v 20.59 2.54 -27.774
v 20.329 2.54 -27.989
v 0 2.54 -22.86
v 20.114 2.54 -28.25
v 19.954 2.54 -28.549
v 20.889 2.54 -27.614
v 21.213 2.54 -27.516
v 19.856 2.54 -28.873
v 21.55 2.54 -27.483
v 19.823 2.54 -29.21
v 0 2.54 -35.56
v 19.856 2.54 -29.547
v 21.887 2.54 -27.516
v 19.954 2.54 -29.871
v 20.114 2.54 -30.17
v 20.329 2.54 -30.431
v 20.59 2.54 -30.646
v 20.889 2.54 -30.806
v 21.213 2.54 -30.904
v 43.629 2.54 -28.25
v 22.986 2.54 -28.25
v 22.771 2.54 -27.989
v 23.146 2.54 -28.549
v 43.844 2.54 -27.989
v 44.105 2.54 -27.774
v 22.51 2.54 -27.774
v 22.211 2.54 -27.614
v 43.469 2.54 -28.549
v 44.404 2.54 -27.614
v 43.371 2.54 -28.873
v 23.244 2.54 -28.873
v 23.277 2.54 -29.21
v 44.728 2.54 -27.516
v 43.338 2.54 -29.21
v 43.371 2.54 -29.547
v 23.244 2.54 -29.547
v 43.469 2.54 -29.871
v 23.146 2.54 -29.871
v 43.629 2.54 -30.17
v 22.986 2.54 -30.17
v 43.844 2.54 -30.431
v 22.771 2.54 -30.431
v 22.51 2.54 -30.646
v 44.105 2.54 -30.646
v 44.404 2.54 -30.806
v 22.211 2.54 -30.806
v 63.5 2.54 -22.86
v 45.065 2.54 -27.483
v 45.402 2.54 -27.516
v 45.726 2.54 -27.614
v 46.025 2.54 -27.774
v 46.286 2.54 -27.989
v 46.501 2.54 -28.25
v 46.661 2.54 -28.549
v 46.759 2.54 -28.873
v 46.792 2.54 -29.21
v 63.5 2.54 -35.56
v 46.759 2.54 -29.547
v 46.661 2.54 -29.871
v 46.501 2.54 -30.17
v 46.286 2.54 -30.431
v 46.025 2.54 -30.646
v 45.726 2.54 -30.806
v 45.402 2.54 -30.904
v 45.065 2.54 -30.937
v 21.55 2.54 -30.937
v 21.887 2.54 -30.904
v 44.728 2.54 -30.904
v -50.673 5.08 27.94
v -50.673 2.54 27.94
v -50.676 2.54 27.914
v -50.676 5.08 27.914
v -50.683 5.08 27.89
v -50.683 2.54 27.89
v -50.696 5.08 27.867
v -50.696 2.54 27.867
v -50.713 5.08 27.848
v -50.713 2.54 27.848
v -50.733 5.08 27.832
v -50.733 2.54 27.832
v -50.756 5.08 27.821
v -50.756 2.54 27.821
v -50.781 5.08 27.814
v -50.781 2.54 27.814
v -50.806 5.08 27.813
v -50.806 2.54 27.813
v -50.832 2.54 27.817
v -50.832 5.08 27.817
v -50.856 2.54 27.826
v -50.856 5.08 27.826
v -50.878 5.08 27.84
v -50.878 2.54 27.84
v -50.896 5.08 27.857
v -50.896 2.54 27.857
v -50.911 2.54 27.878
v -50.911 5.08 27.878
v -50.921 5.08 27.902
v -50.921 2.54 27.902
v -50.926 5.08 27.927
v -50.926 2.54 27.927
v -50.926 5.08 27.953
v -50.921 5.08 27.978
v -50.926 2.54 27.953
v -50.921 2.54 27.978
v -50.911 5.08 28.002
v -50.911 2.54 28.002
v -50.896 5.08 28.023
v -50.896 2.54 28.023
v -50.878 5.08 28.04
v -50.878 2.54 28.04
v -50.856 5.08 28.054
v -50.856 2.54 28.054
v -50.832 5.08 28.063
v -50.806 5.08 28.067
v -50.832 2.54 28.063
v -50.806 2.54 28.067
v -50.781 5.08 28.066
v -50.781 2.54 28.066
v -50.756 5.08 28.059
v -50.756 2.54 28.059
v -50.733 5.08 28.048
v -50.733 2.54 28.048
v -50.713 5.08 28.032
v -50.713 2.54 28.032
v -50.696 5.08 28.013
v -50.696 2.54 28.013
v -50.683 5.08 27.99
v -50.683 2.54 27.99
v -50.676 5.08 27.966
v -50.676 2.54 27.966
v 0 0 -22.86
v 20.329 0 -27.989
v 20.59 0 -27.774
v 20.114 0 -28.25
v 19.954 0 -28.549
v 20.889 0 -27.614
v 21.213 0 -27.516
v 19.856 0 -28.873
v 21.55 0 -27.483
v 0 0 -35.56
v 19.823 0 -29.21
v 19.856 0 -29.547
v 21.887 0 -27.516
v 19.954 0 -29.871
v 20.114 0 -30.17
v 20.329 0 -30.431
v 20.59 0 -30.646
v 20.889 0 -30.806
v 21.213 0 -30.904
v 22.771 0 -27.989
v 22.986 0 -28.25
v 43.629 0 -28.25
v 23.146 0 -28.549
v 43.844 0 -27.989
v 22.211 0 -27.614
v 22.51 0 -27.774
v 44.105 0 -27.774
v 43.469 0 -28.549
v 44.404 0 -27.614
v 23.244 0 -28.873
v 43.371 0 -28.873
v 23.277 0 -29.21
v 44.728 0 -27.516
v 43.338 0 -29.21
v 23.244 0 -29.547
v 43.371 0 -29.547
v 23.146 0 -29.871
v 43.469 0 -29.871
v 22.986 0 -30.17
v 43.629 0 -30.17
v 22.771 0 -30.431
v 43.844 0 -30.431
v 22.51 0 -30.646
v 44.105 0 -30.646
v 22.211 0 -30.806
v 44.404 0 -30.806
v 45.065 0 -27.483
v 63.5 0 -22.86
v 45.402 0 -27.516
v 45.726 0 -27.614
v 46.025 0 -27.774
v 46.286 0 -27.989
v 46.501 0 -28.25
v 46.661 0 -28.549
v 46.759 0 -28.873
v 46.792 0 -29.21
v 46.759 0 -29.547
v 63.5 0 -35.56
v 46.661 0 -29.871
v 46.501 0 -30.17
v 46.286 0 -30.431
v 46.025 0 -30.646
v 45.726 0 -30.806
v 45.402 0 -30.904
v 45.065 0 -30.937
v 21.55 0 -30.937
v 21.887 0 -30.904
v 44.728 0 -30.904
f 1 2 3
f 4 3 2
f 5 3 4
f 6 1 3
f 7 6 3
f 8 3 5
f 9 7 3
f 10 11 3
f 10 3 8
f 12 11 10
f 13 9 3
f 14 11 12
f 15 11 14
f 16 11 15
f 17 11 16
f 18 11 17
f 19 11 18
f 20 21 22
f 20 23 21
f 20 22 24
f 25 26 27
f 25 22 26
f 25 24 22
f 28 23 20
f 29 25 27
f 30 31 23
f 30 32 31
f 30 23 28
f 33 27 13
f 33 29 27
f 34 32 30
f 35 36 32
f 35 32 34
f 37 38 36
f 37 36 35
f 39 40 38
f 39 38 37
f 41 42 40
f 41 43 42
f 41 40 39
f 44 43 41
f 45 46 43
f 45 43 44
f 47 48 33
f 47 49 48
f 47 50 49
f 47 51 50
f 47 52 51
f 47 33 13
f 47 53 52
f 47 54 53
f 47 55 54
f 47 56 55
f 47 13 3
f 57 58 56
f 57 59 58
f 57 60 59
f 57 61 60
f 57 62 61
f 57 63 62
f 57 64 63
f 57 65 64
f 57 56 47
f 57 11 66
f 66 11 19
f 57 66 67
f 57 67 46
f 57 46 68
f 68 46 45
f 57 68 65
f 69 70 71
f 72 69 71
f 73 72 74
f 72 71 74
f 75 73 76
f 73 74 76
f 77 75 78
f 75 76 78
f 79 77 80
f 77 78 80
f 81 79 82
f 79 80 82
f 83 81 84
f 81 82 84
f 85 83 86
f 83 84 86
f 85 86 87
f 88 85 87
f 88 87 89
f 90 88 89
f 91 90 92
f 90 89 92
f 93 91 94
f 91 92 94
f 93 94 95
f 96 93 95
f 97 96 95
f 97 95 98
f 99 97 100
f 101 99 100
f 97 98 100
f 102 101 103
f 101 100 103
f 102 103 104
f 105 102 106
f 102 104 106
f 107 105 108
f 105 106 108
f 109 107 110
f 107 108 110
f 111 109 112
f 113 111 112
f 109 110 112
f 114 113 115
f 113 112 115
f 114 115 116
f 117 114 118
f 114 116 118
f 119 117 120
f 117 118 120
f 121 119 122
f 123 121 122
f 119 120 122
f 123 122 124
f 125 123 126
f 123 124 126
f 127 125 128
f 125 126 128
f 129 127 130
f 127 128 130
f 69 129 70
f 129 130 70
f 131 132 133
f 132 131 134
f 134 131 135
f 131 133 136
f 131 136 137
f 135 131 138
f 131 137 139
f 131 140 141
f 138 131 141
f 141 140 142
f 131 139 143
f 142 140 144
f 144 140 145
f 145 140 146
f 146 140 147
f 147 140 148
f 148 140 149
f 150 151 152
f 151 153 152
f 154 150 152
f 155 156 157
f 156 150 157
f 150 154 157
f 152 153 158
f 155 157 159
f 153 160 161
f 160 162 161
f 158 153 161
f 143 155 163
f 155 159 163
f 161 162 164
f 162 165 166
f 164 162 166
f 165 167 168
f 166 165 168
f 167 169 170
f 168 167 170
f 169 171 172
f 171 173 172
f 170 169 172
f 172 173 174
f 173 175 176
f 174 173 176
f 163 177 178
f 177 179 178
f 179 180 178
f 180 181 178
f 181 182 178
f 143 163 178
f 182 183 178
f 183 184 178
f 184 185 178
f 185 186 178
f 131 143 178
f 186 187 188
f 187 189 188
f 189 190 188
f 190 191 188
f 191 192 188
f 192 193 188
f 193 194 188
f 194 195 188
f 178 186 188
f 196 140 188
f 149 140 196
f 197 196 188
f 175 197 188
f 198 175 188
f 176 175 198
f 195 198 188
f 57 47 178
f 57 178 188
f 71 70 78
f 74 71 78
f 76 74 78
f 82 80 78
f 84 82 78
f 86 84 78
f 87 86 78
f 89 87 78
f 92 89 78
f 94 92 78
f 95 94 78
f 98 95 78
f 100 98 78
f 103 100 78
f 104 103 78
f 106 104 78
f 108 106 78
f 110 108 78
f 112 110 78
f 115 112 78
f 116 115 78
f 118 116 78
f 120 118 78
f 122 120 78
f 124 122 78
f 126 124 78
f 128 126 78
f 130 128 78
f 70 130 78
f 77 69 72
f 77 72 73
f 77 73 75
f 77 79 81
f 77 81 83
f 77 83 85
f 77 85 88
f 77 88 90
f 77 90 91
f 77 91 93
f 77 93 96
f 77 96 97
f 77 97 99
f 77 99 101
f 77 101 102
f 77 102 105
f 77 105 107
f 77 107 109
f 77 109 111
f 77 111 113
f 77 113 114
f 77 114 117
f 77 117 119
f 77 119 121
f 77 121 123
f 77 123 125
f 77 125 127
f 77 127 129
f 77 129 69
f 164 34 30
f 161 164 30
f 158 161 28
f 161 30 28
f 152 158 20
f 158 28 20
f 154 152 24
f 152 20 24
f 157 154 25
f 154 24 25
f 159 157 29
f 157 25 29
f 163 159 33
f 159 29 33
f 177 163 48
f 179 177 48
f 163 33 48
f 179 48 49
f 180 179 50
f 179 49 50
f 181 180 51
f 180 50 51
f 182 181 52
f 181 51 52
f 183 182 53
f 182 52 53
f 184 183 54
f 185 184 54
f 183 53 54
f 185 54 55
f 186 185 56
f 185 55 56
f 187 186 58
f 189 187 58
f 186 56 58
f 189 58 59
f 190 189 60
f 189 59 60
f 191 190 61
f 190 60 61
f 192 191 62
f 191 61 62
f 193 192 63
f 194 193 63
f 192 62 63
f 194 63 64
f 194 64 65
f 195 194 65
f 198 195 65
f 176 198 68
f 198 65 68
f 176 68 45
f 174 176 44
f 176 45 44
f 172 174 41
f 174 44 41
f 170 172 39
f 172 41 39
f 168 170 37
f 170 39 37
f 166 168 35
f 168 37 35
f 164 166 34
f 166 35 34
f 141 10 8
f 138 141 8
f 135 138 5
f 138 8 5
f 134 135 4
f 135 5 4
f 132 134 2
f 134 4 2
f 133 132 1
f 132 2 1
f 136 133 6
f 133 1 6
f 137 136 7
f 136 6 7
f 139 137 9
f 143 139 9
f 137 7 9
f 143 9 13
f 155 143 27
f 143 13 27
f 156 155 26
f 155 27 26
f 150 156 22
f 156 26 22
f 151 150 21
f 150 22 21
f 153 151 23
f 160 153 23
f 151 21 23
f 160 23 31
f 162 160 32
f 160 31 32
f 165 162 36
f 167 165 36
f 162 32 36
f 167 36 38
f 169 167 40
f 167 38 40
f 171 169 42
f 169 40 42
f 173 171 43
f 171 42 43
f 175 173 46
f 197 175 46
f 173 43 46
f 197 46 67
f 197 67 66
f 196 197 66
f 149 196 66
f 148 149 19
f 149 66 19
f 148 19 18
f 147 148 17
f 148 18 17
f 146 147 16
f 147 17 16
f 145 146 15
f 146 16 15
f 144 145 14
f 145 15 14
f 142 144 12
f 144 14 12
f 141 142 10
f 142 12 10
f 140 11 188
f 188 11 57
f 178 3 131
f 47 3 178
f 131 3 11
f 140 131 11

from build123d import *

# Parameters (mm, degrees)
SKETCH1_W           = 107.95
SKETCH1_H           = 58.42
BOSS_EXTRUDE1_DEPTH = 2.54
SKETCH3_OUTSIDE_W   = 134.504
SKETCH3_OUTSIDE_H   = 84.974
SKETCH3_OUTSIDE_W_2 = 63.5
SKETCH3_OUTSIDE_H_2 = 12.7
CUT_EXTRUDE1_DEPTH  = 2.54
SKETCH4_R           = 1.7272
CUT_EXTRUDE2_DEPTH  = 2.54
SKETCH5_R           = 0.127
BOSS_EXTRUDE2_DEPTH = 2.54


with BuildPart() as part:
    # Sketch1 → Boss-Extrude1 (new body)
    with BuildSketch(Plane(origin=(0, 0, 0), x_dir=(1, 0, 0), z_dir=(0, 1, 0))):
        with Locations((53.975, 29.21)):
            Rectangle(SKETCH1_W, SKETCH1_H)
    extrude(amount=BOSS_EXTRUDE1_DEPTH)

    # Sketch3 outside → Cut-Extrude1 (cut)
    with BuildSketch(Plane(origin=(0, 2.54, 0), x_dir=(1, 0, 0), z_dir=(0, 1, 0))):
        with Locations((53.975, 29.21)):
            Rectangle(SKETCH3_OUTSIDE_W, SKETCH3_OUTSIDE_H)
        with Locations((31.75, 29.21)):
            Rectangle(SKETCH3_OUTSIDE_W_2, SKETCH3_OUTSIDE_H_2, mode=Mode.SUBTRACT)
    extrude(amount=-CUT_EXTRUDE1_DEPTH, mode=Mode.SUBTRACT)

    # Sketch4 → Cut-Extrude2 (cut)
    with BuildSketch(Plane(origin=(0, 2.54, 0), x_dir=(-1, 0, 0), z_dir=(0, 1, 0))):
        with Locations((-45.065, -29.21)):
            Circle(SKETCH4_R)
        with Locations((-21.55, -29.21)):
            Circle(SKETCH4_R)
    extrude(amount=-CUT_EXTRUDE2_DEPTH, mode=Mode.SUBTRACT)


with BuildPart() as body_2:
    # Sketch5 → Boss-Extrude2 (new body)
    with BuildSketch(Plane(origin=(0, 2.54, 0), x_dir=(1, 0, 0), z_dir=(0, 1, 0))):
        with Locations((-50.8, -27.94)):
            Circle(SKETCH5_R)
    extrude(amount=BOSS_EXTRUDE2_DEPTH)


solid = Compound([part.part, body_2.part])
